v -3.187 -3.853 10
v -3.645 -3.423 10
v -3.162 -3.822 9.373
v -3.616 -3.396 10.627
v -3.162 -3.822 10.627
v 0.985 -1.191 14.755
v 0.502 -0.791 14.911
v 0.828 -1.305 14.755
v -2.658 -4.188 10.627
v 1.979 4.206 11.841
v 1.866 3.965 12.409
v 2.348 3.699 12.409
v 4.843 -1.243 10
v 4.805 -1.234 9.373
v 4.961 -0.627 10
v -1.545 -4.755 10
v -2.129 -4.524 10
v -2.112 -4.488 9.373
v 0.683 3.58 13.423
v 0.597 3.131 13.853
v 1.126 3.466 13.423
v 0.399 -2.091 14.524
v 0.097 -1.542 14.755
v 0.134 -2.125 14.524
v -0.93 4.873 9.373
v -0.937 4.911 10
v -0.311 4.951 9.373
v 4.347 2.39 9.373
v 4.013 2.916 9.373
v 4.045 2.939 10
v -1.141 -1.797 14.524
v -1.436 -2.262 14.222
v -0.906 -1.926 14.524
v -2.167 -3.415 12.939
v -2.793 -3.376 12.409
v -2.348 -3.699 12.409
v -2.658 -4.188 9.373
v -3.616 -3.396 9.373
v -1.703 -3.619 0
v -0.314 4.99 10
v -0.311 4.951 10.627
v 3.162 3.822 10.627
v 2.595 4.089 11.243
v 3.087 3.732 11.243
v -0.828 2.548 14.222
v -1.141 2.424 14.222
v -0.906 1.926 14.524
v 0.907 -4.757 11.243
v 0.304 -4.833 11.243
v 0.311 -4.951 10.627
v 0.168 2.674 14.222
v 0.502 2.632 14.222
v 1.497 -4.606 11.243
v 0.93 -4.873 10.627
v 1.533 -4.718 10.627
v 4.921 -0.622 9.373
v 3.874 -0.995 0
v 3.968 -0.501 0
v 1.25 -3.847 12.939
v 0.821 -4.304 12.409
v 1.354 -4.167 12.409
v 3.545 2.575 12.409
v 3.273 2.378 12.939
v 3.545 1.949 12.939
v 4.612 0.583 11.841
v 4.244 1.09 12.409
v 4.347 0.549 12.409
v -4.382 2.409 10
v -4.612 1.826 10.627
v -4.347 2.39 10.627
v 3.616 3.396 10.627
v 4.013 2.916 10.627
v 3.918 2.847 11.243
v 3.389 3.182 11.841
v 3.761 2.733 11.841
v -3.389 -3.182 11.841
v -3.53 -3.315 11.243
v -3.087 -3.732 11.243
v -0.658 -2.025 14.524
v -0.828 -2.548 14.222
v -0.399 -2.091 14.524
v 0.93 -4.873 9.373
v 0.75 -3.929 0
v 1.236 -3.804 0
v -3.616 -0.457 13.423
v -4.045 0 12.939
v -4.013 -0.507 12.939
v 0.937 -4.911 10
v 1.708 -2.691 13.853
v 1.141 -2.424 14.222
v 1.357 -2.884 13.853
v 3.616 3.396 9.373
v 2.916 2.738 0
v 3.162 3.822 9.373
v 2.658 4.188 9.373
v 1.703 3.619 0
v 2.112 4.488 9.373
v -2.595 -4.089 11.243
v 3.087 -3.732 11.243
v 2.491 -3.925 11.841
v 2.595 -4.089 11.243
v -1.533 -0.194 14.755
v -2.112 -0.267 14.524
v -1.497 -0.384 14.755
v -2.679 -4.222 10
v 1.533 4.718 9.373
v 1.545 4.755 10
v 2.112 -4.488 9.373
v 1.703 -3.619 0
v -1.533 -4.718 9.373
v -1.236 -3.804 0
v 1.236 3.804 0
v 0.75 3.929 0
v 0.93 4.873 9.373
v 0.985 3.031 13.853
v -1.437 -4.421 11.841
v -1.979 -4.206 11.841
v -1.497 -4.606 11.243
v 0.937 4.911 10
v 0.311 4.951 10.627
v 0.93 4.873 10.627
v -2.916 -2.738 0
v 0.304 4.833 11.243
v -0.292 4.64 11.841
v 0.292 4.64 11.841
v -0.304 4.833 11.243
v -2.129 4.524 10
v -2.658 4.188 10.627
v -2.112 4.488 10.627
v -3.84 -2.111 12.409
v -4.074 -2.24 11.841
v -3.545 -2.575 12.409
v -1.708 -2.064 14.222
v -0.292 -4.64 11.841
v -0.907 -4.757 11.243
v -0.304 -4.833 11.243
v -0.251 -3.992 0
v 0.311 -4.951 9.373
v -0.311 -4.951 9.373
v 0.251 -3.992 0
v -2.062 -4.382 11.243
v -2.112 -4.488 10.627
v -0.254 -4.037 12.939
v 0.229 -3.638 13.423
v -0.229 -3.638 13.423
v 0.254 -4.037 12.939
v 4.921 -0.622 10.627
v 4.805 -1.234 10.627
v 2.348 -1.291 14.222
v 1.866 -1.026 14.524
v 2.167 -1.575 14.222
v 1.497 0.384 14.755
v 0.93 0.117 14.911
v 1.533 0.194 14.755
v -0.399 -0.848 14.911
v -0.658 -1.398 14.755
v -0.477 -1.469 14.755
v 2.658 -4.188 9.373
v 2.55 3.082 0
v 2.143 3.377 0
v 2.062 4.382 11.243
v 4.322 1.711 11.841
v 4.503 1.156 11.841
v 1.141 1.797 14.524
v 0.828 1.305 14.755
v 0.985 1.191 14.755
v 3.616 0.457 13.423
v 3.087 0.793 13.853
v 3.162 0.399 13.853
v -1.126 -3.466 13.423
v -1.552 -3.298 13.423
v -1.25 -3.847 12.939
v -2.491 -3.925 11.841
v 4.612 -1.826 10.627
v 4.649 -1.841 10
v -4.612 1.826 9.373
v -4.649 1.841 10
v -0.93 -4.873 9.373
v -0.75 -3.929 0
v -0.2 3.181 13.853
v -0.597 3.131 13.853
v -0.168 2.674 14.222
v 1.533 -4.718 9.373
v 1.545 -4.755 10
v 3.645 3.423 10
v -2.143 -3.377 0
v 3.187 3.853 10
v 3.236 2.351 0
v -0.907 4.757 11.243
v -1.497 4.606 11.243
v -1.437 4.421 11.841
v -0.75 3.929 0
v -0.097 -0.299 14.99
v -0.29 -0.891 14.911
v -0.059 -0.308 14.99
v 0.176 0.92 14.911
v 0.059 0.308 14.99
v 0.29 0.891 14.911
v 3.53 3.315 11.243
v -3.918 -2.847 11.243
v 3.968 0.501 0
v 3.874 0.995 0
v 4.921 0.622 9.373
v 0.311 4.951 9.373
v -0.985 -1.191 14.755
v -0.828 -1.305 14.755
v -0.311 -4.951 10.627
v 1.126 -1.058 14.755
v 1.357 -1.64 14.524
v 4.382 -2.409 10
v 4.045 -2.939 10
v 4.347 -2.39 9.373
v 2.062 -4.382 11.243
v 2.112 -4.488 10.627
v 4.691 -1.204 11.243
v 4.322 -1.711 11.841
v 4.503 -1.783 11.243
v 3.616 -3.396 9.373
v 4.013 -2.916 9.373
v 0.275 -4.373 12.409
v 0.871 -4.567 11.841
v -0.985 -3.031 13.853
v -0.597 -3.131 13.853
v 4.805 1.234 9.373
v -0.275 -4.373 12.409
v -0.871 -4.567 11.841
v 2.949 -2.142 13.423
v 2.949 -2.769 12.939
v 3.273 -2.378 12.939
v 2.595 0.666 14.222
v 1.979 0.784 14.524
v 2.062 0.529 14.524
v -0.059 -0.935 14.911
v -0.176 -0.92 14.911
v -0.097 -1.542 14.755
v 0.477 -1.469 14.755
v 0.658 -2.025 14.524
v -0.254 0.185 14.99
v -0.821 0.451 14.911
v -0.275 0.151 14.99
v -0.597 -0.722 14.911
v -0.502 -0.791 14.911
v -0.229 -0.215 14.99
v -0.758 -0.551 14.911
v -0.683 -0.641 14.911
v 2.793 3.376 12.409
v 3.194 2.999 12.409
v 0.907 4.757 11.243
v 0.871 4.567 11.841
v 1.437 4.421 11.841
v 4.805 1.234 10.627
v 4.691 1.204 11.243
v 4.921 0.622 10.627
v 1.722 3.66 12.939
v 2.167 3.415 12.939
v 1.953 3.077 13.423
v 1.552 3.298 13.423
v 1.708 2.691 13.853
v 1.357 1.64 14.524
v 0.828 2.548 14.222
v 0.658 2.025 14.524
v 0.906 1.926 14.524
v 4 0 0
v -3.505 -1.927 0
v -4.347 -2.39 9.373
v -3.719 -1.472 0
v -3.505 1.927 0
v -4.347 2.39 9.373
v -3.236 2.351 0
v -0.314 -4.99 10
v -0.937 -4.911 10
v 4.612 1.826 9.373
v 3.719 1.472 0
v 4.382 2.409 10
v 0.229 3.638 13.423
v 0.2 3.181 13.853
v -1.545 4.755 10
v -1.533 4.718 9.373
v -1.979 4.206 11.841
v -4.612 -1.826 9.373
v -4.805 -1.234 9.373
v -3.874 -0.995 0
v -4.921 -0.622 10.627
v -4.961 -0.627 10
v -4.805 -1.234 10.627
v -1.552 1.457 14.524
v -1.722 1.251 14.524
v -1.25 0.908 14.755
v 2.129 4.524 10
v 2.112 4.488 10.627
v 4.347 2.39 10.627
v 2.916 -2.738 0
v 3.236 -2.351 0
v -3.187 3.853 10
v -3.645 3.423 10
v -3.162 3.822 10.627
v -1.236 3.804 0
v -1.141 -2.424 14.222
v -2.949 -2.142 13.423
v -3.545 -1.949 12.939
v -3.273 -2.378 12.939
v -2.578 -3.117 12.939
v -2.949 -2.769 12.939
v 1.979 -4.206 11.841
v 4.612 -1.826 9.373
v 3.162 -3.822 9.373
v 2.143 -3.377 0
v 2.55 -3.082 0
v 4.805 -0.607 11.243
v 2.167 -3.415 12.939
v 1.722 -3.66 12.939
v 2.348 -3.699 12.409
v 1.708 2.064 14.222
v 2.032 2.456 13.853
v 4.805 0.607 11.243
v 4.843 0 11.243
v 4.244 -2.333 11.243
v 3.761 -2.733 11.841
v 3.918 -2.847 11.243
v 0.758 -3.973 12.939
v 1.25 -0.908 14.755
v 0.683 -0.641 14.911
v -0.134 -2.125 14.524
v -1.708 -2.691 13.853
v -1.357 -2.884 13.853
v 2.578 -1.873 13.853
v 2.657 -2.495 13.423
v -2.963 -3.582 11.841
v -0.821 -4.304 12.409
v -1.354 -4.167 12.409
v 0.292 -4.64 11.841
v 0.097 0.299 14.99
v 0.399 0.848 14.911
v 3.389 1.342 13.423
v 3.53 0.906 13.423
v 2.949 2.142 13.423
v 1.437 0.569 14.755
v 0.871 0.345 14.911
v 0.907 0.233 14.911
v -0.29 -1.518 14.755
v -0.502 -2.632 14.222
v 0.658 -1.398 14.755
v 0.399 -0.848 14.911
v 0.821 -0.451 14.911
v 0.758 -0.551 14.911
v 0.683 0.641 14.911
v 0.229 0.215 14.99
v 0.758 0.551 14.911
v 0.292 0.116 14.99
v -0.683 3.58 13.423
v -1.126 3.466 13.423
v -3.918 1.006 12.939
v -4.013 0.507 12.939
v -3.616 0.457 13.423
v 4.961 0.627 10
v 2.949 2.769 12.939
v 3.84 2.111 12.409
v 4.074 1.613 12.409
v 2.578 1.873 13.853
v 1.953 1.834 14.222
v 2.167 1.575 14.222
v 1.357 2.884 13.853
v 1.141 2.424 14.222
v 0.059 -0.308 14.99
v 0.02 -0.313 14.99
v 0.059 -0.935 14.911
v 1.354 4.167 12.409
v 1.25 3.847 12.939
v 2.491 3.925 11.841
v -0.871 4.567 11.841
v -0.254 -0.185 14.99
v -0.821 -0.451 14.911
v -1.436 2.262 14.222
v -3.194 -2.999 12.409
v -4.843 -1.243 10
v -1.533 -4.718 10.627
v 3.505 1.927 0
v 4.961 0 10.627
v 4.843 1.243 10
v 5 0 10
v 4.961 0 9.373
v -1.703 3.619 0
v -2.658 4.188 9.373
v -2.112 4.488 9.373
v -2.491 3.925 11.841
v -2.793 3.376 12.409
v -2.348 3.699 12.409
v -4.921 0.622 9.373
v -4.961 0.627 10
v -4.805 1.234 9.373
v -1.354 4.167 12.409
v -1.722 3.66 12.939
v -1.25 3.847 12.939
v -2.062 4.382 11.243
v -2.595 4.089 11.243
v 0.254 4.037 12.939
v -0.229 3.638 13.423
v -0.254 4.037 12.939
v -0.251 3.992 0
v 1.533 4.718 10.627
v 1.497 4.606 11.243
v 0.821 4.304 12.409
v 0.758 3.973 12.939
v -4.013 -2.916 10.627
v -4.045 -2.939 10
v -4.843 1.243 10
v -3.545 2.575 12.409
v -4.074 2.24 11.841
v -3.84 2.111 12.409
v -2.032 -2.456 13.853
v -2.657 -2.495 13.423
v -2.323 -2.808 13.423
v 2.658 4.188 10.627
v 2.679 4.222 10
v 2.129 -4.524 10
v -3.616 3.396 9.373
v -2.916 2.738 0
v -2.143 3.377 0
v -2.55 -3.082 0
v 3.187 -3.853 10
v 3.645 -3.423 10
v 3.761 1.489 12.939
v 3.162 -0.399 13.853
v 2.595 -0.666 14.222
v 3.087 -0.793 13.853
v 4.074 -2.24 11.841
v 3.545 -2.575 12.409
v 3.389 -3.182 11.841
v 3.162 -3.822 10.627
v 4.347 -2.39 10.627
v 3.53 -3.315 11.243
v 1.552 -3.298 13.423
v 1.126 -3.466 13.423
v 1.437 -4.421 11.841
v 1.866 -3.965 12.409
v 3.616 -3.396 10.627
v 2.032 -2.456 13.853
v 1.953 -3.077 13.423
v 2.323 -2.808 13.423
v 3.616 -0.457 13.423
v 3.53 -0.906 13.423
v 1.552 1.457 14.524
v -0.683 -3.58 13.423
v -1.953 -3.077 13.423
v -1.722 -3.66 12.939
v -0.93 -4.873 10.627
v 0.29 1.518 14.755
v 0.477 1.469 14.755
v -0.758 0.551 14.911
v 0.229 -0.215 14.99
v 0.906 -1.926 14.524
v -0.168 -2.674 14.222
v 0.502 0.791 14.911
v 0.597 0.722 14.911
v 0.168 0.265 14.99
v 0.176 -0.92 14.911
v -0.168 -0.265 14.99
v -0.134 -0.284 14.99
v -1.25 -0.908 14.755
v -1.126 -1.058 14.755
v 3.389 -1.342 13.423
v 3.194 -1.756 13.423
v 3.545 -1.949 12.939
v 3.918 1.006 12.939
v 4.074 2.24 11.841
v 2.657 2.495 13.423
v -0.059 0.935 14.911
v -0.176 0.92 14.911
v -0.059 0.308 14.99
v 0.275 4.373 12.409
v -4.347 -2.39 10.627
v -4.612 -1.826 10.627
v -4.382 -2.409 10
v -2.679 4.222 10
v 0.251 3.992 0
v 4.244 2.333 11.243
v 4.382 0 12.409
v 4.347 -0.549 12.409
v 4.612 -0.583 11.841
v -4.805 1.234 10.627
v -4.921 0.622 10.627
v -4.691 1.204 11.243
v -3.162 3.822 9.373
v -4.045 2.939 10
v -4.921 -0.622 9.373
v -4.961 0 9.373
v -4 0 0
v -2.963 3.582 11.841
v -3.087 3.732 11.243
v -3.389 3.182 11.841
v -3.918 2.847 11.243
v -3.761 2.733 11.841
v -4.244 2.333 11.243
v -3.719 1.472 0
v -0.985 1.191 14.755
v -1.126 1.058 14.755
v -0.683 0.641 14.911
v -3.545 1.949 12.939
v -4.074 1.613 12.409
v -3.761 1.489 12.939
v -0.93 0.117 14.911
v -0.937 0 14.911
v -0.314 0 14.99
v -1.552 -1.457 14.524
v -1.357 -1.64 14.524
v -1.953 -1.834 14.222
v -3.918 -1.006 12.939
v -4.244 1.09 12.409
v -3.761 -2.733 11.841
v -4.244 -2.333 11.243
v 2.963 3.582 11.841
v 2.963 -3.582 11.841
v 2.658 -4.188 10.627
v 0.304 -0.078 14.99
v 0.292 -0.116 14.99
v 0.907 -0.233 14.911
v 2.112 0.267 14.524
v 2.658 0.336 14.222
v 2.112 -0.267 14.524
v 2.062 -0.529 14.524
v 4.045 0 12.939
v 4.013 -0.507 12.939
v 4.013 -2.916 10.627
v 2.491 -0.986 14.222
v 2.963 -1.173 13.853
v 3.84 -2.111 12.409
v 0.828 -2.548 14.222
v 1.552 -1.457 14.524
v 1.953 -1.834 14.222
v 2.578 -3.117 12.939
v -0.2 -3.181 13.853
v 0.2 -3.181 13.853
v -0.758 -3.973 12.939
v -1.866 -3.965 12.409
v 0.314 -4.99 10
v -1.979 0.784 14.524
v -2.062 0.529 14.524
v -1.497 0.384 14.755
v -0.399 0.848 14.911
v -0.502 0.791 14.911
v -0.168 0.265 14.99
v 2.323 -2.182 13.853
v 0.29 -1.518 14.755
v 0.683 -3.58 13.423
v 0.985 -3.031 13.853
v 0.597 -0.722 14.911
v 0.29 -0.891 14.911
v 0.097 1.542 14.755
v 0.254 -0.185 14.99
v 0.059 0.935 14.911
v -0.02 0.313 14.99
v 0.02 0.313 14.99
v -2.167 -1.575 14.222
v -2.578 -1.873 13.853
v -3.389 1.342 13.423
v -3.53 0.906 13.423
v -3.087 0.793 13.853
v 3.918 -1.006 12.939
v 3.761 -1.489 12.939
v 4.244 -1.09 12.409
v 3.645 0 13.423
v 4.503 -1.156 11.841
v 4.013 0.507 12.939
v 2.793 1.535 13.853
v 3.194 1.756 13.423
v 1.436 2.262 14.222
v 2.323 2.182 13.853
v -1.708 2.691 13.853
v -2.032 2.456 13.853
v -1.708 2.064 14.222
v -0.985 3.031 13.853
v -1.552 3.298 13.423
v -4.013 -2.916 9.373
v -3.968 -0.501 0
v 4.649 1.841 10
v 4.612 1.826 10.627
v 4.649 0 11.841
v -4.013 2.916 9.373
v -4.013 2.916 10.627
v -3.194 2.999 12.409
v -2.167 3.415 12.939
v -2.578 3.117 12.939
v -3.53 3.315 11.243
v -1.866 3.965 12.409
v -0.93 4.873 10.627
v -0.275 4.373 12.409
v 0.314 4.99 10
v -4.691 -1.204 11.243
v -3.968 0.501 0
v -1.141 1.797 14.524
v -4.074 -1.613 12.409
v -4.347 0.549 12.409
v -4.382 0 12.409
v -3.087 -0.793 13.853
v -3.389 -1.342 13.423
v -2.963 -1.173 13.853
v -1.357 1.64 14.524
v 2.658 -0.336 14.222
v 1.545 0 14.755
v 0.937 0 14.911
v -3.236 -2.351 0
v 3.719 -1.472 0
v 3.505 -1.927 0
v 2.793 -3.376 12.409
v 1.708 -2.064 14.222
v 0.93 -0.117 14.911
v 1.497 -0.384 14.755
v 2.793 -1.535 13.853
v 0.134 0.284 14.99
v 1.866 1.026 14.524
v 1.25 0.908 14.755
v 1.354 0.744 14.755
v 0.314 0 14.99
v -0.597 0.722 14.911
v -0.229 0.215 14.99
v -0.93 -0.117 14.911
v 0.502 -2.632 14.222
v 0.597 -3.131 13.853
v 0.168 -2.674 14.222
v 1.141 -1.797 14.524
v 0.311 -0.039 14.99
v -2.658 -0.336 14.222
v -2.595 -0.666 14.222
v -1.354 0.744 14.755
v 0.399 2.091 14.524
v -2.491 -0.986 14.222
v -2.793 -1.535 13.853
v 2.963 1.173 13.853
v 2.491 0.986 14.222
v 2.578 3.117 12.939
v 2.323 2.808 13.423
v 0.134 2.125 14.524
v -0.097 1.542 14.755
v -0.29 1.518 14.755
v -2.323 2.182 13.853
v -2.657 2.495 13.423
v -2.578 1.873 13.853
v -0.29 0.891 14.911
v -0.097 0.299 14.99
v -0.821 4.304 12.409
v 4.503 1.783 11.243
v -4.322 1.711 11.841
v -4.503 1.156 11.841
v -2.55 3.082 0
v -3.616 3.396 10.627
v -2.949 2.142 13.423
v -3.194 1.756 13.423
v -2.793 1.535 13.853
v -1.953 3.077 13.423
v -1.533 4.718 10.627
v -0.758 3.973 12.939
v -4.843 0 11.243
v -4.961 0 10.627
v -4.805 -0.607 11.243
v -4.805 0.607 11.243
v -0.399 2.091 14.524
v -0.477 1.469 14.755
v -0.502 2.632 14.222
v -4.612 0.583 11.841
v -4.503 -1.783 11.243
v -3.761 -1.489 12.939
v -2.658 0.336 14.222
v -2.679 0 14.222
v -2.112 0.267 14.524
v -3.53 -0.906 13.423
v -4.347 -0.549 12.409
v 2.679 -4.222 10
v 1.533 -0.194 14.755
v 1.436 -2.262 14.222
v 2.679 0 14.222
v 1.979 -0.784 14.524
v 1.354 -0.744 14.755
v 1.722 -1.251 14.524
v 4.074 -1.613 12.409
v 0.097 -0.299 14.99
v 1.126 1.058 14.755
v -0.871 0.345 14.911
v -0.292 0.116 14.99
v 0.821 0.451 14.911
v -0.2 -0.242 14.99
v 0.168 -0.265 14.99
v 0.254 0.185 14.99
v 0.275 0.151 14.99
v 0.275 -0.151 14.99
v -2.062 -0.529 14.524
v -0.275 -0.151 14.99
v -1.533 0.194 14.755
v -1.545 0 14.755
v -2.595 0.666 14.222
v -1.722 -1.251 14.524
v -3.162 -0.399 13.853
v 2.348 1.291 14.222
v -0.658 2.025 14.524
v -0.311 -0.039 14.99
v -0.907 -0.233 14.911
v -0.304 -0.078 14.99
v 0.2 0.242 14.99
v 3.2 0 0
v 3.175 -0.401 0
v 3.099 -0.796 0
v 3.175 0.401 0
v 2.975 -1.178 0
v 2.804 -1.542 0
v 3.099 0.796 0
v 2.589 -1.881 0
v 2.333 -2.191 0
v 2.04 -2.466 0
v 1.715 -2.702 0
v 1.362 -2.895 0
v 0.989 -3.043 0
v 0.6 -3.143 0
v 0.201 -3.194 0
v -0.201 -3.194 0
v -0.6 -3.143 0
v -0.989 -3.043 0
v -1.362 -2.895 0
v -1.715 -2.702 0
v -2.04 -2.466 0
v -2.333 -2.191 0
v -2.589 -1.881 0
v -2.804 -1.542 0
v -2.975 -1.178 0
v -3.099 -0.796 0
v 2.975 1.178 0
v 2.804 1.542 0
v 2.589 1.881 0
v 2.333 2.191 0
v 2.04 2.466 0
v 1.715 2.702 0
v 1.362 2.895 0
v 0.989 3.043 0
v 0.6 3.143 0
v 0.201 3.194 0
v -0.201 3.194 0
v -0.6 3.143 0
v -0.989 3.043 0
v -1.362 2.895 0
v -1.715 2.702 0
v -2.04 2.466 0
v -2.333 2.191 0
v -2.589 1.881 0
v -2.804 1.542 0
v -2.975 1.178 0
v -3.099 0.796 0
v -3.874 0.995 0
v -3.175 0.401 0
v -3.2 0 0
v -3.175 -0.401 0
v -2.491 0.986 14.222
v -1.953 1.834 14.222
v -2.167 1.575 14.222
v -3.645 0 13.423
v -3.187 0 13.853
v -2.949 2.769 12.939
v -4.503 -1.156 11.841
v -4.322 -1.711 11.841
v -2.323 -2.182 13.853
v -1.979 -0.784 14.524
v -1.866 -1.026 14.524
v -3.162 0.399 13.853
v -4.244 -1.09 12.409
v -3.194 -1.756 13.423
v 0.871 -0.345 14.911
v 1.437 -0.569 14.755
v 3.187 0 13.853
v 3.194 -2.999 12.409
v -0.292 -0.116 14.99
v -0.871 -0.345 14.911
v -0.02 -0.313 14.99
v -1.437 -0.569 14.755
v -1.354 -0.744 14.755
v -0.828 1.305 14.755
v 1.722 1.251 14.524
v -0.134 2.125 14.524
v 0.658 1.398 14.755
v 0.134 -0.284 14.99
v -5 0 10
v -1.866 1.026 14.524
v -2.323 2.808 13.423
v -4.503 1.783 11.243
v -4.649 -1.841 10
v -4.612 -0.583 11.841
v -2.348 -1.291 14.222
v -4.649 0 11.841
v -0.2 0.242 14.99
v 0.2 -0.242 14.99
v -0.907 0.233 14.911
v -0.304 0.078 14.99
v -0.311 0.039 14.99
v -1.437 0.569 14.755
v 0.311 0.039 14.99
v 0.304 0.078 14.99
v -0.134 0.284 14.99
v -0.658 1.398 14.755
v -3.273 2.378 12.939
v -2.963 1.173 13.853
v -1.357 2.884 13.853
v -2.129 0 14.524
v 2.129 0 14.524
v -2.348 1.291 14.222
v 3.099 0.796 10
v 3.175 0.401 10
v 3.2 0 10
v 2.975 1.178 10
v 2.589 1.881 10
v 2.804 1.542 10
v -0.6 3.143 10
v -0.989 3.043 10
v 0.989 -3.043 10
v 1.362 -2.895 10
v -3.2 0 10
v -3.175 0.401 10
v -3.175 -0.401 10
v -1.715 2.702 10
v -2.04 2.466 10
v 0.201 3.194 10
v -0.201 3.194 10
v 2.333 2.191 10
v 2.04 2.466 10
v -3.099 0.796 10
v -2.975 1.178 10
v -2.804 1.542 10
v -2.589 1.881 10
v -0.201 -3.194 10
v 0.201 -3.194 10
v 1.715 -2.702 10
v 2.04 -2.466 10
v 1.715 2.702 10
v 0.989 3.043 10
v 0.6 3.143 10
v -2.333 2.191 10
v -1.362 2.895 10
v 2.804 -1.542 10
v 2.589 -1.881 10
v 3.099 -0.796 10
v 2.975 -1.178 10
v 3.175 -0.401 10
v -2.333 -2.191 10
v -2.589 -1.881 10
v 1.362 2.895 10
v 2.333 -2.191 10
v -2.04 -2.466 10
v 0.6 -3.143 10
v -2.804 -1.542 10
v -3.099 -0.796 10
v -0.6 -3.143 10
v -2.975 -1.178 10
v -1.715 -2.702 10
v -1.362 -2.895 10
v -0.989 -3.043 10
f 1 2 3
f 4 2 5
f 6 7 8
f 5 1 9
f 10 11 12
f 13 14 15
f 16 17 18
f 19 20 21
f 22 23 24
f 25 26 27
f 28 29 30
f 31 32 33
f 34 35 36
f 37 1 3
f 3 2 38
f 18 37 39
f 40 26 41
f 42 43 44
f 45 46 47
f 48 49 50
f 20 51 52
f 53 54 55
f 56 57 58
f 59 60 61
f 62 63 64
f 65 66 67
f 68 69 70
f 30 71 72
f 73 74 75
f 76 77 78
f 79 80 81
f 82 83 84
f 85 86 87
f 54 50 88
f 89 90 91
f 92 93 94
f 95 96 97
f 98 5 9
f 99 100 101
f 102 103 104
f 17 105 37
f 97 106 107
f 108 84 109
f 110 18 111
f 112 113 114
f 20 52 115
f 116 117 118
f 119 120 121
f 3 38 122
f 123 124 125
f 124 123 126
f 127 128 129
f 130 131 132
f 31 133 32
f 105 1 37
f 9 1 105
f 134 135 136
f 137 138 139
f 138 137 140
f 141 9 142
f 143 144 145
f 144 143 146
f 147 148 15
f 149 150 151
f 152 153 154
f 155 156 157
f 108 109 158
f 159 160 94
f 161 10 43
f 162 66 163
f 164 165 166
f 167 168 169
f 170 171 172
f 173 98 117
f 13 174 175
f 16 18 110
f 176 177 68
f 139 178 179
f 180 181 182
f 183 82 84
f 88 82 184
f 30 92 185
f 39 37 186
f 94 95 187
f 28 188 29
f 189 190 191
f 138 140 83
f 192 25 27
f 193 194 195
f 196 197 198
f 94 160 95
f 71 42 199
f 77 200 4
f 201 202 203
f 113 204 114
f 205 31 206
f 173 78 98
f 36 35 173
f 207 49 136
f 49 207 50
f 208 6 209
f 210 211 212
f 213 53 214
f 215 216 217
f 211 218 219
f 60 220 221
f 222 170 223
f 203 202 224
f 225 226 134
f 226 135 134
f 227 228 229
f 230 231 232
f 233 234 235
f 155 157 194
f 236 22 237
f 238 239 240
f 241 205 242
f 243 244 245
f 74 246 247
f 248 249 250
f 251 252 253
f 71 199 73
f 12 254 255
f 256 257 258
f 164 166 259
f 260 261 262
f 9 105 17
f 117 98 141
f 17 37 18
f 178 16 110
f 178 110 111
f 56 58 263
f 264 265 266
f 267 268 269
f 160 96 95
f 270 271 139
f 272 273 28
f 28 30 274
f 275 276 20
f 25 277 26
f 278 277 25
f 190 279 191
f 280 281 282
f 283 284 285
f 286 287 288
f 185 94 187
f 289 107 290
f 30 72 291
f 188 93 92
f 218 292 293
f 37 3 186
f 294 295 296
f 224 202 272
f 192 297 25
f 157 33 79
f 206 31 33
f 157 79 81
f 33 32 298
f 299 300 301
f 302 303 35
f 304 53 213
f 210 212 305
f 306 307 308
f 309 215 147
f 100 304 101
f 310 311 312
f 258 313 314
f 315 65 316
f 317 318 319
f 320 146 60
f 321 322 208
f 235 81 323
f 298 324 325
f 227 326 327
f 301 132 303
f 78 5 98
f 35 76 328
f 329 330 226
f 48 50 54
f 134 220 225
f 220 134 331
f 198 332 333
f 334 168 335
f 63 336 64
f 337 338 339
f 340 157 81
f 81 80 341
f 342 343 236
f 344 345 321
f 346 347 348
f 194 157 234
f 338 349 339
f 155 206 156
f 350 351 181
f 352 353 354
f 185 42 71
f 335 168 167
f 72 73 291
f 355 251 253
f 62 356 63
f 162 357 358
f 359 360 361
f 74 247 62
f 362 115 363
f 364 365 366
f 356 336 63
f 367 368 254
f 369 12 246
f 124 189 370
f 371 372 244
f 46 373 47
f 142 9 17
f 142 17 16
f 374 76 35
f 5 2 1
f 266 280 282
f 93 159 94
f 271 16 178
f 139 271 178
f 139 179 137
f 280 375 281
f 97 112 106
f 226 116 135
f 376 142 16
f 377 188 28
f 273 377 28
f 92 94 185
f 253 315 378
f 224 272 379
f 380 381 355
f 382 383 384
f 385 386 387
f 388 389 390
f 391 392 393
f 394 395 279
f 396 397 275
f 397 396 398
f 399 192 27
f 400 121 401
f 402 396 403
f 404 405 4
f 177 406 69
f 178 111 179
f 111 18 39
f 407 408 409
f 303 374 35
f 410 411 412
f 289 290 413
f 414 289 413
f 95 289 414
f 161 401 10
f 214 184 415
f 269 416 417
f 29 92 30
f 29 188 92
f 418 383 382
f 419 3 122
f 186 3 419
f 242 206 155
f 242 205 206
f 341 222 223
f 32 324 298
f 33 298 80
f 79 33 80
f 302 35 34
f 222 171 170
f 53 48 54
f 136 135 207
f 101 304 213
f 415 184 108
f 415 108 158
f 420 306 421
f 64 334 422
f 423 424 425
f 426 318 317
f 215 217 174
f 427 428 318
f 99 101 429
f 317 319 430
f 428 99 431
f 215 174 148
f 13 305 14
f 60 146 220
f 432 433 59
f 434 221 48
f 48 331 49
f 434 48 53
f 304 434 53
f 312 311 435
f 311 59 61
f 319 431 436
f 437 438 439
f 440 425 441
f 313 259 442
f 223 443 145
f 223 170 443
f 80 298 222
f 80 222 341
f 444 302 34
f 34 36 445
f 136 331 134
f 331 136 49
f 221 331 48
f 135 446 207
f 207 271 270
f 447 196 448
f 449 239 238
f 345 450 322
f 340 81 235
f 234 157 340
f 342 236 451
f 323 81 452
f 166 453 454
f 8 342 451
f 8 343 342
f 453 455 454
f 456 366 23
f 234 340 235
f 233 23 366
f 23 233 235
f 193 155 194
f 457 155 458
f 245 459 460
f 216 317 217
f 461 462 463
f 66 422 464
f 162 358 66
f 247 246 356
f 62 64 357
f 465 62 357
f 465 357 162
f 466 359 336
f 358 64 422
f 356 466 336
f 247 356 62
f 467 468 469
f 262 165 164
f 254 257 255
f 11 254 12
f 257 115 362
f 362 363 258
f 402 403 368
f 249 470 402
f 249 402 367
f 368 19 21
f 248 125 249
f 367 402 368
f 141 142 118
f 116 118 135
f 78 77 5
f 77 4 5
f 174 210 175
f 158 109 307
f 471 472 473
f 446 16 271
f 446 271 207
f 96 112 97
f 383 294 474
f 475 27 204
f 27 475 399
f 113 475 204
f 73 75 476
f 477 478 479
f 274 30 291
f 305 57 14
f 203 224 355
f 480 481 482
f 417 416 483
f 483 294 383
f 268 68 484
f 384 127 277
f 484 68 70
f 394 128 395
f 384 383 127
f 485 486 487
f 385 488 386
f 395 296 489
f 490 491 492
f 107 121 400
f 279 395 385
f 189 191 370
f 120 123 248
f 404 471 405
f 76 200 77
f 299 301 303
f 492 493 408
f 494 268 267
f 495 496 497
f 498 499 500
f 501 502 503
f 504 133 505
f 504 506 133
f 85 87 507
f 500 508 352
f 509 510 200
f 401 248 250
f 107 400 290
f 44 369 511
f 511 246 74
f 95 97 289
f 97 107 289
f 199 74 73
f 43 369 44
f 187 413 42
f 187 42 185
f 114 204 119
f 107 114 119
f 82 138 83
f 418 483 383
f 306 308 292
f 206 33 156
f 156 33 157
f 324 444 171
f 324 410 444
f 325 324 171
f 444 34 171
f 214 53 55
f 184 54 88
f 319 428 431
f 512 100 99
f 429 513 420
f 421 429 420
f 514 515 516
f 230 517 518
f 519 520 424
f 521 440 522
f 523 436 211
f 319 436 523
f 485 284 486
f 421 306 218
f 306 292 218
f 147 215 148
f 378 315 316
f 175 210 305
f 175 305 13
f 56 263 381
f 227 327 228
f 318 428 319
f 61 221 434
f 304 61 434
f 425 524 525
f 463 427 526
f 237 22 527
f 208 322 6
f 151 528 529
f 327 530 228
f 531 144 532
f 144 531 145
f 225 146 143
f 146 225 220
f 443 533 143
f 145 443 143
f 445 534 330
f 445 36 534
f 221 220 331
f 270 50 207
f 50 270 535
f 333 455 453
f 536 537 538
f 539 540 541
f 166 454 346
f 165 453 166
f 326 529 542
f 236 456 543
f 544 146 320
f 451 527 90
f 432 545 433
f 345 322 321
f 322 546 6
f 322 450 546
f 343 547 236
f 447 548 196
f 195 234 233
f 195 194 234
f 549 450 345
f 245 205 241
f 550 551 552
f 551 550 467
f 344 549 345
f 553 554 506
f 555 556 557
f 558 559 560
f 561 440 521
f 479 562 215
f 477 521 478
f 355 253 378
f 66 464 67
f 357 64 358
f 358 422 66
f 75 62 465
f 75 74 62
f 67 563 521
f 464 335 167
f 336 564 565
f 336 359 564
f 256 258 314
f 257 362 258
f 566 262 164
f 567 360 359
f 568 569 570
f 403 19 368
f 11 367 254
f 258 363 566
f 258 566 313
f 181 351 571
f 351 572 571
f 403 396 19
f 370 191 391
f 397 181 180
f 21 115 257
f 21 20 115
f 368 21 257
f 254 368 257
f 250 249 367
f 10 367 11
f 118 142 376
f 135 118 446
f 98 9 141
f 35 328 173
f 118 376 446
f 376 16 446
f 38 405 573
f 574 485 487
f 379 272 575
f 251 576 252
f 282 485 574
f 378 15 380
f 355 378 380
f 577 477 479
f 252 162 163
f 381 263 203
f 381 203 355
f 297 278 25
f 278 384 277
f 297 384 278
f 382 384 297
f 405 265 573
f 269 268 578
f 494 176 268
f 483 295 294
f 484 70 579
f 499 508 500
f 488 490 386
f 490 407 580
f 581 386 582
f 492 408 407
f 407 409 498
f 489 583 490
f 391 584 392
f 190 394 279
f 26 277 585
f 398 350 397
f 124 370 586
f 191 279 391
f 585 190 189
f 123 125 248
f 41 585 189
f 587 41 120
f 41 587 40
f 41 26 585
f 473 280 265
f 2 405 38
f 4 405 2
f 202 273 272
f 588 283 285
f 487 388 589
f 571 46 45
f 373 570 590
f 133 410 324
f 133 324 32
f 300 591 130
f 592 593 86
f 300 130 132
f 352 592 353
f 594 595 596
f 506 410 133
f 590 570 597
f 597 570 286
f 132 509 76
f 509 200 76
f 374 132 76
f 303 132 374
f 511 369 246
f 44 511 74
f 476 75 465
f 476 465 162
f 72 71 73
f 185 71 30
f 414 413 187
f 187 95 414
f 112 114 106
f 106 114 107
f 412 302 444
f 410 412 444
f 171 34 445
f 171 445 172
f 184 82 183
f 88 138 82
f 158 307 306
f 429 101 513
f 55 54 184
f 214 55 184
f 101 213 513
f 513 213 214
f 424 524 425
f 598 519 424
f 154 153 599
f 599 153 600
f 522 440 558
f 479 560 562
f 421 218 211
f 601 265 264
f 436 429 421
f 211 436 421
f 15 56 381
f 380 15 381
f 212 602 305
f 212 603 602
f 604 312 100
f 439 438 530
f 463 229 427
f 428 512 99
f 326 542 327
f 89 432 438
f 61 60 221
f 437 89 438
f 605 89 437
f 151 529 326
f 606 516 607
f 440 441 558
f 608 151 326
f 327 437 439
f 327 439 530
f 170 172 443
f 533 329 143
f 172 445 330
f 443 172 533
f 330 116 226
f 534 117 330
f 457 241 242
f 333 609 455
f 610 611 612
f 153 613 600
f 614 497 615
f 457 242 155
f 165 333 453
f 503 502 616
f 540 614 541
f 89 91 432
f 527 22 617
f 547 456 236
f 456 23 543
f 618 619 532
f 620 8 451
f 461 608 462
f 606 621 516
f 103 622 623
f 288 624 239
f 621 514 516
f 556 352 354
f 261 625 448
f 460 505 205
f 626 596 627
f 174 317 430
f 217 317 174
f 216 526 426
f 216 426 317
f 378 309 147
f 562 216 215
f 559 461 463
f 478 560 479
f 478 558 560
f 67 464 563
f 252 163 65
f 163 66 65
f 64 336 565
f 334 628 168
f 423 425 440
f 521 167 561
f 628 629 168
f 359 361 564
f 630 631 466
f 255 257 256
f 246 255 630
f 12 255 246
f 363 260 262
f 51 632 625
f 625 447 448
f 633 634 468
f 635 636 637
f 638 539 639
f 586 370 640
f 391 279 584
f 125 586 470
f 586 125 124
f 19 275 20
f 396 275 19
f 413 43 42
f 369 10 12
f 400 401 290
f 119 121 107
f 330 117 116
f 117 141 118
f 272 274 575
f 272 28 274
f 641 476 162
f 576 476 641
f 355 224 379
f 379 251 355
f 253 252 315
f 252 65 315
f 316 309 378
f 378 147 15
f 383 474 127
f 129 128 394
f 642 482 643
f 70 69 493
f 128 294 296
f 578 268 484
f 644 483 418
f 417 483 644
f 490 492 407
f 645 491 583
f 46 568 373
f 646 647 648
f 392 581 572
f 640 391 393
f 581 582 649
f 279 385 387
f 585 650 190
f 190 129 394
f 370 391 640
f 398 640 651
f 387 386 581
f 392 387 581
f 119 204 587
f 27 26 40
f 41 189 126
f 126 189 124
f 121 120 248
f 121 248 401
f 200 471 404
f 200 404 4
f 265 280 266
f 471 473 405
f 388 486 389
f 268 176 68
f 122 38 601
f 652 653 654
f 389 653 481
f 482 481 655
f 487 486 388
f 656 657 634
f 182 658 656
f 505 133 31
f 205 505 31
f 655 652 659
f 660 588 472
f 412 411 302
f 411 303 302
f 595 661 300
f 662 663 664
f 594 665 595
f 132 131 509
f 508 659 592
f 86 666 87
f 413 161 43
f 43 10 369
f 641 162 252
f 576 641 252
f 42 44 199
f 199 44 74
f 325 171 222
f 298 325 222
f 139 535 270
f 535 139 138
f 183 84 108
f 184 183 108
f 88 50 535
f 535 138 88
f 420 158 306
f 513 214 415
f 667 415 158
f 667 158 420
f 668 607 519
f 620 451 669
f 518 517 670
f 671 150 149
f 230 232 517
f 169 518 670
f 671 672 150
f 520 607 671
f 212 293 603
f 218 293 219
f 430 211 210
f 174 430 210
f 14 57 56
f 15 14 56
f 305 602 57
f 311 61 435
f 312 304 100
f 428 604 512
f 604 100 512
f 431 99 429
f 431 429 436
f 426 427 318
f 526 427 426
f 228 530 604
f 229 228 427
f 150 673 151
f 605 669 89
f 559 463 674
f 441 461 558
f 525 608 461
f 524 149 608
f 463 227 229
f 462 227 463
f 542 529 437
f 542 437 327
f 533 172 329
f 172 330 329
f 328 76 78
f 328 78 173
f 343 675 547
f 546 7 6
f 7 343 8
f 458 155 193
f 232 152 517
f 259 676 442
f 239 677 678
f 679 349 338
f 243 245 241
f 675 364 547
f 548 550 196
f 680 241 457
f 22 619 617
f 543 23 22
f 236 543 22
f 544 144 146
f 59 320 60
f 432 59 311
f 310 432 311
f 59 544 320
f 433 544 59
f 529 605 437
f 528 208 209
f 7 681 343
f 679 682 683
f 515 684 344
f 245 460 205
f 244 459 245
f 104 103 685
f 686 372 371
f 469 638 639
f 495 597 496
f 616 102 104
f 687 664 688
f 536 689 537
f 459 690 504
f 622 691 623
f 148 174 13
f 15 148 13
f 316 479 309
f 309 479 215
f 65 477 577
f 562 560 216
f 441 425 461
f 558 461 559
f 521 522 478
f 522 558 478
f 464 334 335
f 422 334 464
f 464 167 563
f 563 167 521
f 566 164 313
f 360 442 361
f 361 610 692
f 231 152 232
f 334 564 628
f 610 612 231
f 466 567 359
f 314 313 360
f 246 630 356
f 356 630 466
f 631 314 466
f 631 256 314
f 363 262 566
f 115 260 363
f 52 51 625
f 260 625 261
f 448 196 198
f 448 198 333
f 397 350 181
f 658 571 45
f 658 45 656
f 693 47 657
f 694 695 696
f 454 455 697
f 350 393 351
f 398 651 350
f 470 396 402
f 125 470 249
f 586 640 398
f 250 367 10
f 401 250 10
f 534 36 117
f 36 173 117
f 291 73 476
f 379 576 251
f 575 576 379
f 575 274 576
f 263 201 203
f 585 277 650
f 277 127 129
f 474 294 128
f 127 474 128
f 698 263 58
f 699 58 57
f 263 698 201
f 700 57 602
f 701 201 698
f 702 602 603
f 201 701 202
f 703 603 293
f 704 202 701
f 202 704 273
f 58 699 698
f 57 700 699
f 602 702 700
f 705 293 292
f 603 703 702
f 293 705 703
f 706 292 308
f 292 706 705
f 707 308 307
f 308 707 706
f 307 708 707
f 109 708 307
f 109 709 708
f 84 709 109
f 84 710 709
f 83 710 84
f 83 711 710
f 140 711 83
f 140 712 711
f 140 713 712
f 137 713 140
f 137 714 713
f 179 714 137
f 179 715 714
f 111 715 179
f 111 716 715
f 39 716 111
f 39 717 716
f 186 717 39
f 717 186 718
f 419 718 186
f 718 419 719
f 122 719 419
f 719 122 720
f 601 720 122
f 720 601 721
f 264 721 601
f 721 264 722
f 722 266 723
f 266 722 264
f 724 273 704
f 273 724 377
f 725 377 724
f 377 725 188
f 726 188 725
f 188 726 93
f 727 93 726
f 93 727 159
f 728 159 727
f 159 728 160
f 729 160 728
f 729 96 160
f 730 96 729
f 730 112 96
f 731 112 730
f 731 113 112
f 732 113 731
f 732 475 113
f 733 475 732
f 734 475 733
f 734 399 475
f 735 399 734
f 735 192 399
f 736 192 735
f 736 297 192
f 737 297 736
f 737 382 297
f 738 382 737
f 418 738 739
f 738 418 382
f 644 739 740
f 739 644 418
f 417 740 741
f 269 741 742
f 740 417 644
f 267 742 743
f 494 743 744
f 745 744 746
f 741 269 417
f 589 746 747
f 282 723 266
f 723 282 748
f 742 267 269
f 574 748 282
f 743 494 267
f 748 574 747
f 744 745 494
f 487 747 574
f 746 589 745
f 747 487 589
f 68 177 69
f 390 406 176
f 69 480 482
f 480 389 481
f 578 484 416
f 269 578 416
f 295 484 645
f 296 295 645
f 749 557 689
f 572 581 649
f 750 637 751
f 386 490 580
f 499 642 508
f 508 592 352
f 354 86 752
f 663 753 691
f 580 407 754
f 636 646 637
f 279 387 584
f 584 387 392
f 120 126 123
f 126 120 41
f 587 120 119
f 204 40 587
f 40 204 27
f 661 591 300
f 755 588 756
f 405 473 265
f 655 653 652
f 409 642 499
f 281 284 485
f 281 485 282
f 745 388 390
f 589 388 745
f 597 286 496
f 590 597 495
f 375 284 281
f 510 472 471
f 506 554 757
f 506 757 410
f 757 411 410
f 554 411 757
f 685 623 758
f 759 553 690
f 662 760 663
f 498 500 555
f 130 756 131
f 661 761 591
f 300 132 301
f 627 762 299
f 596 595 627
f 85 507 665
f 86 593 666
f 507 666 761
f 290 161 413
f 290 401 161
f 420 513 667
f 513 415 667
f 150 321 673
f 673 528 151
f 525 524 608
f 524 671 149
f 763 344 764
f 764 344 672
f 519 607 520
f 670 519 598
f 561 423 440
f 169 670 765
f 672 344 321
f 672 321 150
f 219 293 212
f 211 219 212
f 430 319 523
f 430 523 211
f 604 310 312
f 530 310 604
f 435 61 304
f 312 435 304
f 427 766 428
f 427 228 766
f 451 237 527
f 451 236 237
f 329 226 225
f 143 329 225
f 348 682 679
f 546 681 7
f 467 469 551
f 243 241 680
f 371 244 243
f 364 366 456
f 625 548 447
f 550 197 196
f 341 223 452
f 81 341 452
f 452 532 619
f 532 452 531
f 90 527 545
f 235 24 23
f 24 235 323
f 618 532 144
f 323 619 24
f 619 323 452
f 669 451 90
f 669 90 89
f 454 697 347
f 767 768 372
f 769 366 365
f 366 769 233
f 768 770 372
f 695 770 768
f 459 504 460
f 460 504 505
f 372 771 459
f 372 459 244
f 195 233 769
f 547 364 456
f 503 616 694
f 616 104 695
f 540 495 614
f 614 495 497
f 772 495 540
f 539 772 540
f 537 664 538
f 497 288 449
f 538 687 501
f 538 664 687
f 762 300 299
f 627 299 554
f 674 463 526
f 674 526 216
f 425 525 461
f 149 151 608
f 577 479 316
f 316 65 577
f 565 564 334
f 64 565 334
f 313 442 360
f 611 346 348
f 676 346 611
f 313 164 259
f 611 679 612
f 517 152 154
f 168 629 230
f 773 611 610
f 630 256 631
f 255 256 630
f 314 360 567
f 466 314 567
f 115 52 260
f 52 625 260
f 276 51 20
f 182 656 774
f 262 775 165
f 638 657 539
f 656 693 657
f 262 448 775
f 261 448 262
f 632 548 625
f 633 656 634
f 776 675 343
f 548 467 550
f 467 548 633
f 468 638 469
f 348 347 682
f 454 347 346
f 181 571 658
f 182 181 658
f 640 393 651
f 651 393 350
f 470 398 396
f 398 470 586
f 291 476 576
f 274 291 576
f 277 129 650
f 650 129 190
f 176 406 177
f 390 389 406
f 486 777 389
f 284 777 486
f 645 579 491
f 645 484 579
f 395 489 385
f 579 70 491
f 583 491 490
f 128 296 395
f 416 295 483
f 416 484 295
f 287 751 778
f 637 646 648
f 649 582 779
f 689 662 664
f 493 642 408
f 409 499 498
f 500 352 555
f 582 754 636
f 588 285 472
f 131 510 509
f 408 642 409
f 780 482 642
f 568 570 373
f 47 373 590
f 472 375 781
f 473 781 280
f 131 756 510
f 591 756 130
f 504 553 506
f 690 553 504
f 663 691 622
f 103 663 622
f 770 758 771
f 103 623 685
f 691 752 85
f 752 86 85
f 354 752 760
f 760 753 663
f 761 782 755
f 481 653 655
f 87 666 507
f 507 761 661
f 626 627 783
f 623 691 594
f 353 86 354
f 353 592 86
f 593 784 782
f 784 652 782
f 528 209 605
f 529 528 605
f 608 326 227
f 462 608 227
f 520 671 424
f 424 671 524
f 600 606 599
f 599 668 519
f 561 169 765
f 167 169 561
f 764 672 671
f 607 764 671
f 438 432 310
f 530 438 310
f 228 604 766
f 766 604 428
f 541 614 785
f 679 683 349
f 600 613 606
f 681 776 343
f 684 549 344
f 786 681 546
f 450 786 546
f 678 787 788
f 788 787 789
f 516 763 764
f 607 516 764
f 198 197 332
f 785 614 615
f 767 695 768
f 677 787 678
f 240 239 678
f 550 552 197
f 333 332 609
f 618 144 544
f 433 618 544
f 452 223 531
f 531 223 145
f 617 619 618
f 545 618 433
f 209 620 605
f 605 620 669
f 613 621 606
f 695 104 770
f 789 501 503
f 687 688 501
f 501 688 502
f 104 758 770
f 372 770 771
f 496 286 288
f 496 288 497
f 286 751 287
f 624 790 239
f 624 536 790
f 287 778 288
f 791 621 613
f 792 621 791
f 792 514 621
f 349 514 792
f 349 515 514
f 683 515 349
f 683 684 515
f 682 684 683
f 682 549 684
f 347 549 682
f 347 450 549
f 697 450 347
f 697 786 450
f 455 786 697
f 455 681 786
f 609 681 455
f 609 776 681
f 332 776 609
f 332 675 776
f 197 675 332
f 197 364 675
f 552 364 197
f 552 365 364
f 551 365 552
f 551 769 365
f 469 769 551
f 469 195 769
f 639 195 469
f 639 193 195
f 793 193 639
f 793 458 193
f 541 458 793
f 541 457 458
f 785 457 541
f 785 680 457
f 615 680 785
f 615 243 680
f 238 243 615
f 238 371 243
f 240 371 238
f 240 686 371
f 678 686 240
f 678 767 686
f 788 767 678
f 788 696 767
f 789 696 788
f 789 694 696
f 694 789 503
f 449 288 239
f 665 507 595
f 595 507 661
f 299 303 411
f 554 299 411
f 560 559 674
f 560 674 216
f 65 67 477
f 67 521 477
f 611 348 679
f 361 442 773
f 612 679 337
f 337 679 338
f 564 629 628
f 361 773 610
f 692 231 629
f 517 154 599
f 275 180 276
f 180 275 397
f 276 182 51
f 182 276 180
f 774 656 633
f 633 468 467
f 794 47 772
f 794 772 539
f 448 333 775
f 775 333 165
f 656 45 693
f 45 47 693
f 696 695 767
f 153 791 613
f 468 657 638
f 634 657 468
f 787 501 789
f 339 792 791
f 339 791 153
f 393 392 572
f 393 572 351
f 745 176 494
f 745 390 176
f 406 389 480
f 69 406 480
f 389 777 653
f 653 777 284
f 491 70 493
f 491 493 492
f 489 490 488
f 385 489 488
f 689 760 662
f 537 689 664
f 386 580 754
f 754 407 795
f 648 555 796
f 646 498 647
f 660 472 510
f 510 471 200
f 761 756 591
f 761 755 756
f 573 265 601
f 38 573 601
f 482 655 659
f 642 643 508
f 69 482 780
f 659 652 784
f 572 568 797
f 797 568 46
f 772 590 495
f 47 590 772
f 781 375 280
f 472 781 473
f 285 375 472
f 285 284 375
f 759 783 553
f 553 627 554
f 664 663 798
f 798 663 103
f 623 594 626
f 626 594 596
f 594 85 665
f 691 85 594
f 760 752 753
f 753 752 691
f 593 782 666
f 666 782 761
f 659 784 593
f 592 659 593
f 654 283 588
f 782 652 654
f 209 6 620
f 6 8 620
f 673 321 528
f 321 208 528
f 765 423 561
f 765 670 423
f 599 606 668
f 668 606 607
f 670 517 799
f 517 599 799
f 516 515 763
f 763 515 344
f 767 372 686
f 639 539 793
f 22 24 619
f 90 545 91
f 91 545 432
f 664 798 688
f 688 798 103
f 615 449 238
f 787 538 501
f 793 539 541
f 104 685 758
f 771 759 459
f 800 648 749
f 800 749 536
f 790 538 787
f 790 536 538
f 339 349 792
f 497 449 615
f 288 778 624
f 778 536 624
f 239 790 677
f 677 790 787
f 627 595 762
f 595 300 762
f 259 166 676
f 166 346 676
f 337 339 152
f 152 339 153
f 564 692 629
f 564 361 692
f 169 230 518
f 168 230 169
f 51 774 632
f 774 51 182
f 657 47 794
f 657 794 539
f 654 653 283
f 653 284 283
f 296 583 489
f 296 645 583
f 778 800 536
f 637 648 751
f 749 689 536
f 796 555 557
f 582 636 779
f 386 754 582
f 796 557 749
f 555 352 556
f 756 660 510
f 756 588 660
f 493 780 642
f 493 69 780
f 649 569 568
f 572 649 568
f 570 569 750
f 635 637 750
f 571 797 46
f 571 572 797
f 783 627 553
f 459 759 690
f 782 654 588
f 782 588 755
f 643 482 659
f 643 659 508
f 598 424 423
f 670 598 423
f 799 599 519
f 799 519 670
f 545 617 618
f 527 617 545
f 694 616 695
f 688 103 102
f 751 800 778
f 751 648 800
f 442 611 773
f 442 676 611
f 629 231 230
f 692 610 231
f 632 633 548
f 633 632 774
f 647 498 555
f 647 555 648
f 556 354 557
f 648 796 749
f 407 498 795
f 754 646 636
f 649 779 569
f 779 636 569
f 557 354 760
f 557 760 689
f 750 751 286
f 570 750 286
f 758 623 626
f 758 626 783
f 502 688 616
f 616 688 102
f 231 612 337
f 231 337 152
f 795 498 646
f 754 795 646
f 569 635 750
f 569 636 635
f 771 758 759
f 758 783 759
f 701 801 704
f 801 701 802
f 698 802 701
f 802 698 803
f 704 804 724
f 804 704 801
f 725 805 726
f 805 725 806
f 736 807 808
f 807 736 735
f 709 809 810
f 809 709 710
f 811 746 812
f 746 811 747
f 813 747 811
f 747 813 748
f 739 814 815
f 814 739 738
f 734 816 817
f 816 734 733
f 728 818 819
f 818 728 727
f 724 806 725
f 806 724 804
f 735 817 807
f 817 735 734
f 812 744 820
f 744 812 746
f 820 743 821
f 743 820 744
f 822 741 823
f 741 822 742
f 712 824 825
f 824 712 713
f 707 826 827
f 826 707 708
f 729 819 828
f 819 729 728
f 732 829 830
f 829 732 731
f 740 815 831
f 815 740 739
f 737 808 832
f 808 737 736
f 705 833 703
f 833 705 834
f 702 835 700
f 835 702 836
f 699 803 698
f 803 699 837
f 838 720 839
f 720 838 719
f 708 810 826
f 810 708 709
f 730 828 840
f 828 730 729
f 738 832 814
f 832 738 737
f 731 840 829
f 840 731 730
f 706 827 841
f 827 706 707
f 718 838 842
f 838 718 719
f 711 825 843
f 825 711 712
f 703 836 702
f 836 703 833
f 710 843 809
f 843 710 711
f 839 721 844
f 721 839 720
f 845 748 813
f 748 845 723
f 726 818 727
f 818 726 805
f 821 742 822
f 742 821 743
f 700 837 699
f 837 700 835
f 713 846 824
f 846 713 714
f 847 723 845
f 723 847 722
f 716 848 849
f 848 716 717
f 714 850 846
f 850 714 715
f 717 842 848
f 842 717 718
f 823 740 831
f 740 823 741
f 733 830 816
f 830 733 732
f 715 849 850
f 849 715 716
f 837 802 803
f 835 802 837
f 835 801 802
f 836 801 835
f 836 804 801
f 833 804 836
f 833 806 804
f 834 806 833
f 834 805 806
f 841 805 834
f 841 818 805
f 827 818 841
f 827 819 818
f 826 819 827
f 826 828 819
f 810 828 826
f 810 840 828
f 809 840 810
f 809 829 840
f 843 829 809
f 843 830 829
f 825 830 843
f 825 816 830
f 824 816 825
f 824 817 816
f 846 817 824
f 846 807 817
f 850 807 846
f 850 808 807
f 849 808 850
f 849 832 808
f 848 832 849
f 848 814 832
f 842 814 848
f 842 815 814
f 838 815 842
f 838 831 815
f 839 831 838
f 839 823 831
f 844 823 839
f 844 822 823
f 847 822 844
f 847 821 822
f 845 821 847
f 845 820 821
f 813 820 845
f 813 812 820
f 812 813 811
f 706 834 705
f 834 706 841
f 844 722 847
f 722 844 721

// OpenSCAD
/*
 *  This file is part of the portable pluggable YAGI Design.
 *
 *  This documentation describes Open Hardware and is licensed under the
 *  CERN OHL either version 1.2 of the license, or (at your option) any
 *  later version.
 *
 *  You may redistribute and modify this documentation under the terms of
 *  the CERN OHL v.1.2 (http://ohwr.org/cernohl). This documentation is
 *  distributed WITHOUT ANY EXPRESS OR IMPLIED WARRANTY, INCLUDING OF
 *  MERCHANTABILITY, SATISFACTORY QUALITY AND FITNESS FOR A PARTICULAR PURPOSE.
 *  Please see the CERN OHL v.1.2 for applicable conditions.
 *
 *  Copyright (c) 2016 Thomas Pointhuber
 */

module endcap(hole_diameter=6.4,
              hole_length=10,
              start_diameter=8,
              end_diameter=10) {
    $fn = 50;

    difference() {
        hull() {
            cylinder(r=start_diameter/2, h=hole_length);
            translate([0, 0 , hole_length]) sphere(d=end_diameter);
        }
        translate([0, 0 , -1]) cylinder(r=hole_diameter/2, h=hole_length+1);
    }
}

endcap();
